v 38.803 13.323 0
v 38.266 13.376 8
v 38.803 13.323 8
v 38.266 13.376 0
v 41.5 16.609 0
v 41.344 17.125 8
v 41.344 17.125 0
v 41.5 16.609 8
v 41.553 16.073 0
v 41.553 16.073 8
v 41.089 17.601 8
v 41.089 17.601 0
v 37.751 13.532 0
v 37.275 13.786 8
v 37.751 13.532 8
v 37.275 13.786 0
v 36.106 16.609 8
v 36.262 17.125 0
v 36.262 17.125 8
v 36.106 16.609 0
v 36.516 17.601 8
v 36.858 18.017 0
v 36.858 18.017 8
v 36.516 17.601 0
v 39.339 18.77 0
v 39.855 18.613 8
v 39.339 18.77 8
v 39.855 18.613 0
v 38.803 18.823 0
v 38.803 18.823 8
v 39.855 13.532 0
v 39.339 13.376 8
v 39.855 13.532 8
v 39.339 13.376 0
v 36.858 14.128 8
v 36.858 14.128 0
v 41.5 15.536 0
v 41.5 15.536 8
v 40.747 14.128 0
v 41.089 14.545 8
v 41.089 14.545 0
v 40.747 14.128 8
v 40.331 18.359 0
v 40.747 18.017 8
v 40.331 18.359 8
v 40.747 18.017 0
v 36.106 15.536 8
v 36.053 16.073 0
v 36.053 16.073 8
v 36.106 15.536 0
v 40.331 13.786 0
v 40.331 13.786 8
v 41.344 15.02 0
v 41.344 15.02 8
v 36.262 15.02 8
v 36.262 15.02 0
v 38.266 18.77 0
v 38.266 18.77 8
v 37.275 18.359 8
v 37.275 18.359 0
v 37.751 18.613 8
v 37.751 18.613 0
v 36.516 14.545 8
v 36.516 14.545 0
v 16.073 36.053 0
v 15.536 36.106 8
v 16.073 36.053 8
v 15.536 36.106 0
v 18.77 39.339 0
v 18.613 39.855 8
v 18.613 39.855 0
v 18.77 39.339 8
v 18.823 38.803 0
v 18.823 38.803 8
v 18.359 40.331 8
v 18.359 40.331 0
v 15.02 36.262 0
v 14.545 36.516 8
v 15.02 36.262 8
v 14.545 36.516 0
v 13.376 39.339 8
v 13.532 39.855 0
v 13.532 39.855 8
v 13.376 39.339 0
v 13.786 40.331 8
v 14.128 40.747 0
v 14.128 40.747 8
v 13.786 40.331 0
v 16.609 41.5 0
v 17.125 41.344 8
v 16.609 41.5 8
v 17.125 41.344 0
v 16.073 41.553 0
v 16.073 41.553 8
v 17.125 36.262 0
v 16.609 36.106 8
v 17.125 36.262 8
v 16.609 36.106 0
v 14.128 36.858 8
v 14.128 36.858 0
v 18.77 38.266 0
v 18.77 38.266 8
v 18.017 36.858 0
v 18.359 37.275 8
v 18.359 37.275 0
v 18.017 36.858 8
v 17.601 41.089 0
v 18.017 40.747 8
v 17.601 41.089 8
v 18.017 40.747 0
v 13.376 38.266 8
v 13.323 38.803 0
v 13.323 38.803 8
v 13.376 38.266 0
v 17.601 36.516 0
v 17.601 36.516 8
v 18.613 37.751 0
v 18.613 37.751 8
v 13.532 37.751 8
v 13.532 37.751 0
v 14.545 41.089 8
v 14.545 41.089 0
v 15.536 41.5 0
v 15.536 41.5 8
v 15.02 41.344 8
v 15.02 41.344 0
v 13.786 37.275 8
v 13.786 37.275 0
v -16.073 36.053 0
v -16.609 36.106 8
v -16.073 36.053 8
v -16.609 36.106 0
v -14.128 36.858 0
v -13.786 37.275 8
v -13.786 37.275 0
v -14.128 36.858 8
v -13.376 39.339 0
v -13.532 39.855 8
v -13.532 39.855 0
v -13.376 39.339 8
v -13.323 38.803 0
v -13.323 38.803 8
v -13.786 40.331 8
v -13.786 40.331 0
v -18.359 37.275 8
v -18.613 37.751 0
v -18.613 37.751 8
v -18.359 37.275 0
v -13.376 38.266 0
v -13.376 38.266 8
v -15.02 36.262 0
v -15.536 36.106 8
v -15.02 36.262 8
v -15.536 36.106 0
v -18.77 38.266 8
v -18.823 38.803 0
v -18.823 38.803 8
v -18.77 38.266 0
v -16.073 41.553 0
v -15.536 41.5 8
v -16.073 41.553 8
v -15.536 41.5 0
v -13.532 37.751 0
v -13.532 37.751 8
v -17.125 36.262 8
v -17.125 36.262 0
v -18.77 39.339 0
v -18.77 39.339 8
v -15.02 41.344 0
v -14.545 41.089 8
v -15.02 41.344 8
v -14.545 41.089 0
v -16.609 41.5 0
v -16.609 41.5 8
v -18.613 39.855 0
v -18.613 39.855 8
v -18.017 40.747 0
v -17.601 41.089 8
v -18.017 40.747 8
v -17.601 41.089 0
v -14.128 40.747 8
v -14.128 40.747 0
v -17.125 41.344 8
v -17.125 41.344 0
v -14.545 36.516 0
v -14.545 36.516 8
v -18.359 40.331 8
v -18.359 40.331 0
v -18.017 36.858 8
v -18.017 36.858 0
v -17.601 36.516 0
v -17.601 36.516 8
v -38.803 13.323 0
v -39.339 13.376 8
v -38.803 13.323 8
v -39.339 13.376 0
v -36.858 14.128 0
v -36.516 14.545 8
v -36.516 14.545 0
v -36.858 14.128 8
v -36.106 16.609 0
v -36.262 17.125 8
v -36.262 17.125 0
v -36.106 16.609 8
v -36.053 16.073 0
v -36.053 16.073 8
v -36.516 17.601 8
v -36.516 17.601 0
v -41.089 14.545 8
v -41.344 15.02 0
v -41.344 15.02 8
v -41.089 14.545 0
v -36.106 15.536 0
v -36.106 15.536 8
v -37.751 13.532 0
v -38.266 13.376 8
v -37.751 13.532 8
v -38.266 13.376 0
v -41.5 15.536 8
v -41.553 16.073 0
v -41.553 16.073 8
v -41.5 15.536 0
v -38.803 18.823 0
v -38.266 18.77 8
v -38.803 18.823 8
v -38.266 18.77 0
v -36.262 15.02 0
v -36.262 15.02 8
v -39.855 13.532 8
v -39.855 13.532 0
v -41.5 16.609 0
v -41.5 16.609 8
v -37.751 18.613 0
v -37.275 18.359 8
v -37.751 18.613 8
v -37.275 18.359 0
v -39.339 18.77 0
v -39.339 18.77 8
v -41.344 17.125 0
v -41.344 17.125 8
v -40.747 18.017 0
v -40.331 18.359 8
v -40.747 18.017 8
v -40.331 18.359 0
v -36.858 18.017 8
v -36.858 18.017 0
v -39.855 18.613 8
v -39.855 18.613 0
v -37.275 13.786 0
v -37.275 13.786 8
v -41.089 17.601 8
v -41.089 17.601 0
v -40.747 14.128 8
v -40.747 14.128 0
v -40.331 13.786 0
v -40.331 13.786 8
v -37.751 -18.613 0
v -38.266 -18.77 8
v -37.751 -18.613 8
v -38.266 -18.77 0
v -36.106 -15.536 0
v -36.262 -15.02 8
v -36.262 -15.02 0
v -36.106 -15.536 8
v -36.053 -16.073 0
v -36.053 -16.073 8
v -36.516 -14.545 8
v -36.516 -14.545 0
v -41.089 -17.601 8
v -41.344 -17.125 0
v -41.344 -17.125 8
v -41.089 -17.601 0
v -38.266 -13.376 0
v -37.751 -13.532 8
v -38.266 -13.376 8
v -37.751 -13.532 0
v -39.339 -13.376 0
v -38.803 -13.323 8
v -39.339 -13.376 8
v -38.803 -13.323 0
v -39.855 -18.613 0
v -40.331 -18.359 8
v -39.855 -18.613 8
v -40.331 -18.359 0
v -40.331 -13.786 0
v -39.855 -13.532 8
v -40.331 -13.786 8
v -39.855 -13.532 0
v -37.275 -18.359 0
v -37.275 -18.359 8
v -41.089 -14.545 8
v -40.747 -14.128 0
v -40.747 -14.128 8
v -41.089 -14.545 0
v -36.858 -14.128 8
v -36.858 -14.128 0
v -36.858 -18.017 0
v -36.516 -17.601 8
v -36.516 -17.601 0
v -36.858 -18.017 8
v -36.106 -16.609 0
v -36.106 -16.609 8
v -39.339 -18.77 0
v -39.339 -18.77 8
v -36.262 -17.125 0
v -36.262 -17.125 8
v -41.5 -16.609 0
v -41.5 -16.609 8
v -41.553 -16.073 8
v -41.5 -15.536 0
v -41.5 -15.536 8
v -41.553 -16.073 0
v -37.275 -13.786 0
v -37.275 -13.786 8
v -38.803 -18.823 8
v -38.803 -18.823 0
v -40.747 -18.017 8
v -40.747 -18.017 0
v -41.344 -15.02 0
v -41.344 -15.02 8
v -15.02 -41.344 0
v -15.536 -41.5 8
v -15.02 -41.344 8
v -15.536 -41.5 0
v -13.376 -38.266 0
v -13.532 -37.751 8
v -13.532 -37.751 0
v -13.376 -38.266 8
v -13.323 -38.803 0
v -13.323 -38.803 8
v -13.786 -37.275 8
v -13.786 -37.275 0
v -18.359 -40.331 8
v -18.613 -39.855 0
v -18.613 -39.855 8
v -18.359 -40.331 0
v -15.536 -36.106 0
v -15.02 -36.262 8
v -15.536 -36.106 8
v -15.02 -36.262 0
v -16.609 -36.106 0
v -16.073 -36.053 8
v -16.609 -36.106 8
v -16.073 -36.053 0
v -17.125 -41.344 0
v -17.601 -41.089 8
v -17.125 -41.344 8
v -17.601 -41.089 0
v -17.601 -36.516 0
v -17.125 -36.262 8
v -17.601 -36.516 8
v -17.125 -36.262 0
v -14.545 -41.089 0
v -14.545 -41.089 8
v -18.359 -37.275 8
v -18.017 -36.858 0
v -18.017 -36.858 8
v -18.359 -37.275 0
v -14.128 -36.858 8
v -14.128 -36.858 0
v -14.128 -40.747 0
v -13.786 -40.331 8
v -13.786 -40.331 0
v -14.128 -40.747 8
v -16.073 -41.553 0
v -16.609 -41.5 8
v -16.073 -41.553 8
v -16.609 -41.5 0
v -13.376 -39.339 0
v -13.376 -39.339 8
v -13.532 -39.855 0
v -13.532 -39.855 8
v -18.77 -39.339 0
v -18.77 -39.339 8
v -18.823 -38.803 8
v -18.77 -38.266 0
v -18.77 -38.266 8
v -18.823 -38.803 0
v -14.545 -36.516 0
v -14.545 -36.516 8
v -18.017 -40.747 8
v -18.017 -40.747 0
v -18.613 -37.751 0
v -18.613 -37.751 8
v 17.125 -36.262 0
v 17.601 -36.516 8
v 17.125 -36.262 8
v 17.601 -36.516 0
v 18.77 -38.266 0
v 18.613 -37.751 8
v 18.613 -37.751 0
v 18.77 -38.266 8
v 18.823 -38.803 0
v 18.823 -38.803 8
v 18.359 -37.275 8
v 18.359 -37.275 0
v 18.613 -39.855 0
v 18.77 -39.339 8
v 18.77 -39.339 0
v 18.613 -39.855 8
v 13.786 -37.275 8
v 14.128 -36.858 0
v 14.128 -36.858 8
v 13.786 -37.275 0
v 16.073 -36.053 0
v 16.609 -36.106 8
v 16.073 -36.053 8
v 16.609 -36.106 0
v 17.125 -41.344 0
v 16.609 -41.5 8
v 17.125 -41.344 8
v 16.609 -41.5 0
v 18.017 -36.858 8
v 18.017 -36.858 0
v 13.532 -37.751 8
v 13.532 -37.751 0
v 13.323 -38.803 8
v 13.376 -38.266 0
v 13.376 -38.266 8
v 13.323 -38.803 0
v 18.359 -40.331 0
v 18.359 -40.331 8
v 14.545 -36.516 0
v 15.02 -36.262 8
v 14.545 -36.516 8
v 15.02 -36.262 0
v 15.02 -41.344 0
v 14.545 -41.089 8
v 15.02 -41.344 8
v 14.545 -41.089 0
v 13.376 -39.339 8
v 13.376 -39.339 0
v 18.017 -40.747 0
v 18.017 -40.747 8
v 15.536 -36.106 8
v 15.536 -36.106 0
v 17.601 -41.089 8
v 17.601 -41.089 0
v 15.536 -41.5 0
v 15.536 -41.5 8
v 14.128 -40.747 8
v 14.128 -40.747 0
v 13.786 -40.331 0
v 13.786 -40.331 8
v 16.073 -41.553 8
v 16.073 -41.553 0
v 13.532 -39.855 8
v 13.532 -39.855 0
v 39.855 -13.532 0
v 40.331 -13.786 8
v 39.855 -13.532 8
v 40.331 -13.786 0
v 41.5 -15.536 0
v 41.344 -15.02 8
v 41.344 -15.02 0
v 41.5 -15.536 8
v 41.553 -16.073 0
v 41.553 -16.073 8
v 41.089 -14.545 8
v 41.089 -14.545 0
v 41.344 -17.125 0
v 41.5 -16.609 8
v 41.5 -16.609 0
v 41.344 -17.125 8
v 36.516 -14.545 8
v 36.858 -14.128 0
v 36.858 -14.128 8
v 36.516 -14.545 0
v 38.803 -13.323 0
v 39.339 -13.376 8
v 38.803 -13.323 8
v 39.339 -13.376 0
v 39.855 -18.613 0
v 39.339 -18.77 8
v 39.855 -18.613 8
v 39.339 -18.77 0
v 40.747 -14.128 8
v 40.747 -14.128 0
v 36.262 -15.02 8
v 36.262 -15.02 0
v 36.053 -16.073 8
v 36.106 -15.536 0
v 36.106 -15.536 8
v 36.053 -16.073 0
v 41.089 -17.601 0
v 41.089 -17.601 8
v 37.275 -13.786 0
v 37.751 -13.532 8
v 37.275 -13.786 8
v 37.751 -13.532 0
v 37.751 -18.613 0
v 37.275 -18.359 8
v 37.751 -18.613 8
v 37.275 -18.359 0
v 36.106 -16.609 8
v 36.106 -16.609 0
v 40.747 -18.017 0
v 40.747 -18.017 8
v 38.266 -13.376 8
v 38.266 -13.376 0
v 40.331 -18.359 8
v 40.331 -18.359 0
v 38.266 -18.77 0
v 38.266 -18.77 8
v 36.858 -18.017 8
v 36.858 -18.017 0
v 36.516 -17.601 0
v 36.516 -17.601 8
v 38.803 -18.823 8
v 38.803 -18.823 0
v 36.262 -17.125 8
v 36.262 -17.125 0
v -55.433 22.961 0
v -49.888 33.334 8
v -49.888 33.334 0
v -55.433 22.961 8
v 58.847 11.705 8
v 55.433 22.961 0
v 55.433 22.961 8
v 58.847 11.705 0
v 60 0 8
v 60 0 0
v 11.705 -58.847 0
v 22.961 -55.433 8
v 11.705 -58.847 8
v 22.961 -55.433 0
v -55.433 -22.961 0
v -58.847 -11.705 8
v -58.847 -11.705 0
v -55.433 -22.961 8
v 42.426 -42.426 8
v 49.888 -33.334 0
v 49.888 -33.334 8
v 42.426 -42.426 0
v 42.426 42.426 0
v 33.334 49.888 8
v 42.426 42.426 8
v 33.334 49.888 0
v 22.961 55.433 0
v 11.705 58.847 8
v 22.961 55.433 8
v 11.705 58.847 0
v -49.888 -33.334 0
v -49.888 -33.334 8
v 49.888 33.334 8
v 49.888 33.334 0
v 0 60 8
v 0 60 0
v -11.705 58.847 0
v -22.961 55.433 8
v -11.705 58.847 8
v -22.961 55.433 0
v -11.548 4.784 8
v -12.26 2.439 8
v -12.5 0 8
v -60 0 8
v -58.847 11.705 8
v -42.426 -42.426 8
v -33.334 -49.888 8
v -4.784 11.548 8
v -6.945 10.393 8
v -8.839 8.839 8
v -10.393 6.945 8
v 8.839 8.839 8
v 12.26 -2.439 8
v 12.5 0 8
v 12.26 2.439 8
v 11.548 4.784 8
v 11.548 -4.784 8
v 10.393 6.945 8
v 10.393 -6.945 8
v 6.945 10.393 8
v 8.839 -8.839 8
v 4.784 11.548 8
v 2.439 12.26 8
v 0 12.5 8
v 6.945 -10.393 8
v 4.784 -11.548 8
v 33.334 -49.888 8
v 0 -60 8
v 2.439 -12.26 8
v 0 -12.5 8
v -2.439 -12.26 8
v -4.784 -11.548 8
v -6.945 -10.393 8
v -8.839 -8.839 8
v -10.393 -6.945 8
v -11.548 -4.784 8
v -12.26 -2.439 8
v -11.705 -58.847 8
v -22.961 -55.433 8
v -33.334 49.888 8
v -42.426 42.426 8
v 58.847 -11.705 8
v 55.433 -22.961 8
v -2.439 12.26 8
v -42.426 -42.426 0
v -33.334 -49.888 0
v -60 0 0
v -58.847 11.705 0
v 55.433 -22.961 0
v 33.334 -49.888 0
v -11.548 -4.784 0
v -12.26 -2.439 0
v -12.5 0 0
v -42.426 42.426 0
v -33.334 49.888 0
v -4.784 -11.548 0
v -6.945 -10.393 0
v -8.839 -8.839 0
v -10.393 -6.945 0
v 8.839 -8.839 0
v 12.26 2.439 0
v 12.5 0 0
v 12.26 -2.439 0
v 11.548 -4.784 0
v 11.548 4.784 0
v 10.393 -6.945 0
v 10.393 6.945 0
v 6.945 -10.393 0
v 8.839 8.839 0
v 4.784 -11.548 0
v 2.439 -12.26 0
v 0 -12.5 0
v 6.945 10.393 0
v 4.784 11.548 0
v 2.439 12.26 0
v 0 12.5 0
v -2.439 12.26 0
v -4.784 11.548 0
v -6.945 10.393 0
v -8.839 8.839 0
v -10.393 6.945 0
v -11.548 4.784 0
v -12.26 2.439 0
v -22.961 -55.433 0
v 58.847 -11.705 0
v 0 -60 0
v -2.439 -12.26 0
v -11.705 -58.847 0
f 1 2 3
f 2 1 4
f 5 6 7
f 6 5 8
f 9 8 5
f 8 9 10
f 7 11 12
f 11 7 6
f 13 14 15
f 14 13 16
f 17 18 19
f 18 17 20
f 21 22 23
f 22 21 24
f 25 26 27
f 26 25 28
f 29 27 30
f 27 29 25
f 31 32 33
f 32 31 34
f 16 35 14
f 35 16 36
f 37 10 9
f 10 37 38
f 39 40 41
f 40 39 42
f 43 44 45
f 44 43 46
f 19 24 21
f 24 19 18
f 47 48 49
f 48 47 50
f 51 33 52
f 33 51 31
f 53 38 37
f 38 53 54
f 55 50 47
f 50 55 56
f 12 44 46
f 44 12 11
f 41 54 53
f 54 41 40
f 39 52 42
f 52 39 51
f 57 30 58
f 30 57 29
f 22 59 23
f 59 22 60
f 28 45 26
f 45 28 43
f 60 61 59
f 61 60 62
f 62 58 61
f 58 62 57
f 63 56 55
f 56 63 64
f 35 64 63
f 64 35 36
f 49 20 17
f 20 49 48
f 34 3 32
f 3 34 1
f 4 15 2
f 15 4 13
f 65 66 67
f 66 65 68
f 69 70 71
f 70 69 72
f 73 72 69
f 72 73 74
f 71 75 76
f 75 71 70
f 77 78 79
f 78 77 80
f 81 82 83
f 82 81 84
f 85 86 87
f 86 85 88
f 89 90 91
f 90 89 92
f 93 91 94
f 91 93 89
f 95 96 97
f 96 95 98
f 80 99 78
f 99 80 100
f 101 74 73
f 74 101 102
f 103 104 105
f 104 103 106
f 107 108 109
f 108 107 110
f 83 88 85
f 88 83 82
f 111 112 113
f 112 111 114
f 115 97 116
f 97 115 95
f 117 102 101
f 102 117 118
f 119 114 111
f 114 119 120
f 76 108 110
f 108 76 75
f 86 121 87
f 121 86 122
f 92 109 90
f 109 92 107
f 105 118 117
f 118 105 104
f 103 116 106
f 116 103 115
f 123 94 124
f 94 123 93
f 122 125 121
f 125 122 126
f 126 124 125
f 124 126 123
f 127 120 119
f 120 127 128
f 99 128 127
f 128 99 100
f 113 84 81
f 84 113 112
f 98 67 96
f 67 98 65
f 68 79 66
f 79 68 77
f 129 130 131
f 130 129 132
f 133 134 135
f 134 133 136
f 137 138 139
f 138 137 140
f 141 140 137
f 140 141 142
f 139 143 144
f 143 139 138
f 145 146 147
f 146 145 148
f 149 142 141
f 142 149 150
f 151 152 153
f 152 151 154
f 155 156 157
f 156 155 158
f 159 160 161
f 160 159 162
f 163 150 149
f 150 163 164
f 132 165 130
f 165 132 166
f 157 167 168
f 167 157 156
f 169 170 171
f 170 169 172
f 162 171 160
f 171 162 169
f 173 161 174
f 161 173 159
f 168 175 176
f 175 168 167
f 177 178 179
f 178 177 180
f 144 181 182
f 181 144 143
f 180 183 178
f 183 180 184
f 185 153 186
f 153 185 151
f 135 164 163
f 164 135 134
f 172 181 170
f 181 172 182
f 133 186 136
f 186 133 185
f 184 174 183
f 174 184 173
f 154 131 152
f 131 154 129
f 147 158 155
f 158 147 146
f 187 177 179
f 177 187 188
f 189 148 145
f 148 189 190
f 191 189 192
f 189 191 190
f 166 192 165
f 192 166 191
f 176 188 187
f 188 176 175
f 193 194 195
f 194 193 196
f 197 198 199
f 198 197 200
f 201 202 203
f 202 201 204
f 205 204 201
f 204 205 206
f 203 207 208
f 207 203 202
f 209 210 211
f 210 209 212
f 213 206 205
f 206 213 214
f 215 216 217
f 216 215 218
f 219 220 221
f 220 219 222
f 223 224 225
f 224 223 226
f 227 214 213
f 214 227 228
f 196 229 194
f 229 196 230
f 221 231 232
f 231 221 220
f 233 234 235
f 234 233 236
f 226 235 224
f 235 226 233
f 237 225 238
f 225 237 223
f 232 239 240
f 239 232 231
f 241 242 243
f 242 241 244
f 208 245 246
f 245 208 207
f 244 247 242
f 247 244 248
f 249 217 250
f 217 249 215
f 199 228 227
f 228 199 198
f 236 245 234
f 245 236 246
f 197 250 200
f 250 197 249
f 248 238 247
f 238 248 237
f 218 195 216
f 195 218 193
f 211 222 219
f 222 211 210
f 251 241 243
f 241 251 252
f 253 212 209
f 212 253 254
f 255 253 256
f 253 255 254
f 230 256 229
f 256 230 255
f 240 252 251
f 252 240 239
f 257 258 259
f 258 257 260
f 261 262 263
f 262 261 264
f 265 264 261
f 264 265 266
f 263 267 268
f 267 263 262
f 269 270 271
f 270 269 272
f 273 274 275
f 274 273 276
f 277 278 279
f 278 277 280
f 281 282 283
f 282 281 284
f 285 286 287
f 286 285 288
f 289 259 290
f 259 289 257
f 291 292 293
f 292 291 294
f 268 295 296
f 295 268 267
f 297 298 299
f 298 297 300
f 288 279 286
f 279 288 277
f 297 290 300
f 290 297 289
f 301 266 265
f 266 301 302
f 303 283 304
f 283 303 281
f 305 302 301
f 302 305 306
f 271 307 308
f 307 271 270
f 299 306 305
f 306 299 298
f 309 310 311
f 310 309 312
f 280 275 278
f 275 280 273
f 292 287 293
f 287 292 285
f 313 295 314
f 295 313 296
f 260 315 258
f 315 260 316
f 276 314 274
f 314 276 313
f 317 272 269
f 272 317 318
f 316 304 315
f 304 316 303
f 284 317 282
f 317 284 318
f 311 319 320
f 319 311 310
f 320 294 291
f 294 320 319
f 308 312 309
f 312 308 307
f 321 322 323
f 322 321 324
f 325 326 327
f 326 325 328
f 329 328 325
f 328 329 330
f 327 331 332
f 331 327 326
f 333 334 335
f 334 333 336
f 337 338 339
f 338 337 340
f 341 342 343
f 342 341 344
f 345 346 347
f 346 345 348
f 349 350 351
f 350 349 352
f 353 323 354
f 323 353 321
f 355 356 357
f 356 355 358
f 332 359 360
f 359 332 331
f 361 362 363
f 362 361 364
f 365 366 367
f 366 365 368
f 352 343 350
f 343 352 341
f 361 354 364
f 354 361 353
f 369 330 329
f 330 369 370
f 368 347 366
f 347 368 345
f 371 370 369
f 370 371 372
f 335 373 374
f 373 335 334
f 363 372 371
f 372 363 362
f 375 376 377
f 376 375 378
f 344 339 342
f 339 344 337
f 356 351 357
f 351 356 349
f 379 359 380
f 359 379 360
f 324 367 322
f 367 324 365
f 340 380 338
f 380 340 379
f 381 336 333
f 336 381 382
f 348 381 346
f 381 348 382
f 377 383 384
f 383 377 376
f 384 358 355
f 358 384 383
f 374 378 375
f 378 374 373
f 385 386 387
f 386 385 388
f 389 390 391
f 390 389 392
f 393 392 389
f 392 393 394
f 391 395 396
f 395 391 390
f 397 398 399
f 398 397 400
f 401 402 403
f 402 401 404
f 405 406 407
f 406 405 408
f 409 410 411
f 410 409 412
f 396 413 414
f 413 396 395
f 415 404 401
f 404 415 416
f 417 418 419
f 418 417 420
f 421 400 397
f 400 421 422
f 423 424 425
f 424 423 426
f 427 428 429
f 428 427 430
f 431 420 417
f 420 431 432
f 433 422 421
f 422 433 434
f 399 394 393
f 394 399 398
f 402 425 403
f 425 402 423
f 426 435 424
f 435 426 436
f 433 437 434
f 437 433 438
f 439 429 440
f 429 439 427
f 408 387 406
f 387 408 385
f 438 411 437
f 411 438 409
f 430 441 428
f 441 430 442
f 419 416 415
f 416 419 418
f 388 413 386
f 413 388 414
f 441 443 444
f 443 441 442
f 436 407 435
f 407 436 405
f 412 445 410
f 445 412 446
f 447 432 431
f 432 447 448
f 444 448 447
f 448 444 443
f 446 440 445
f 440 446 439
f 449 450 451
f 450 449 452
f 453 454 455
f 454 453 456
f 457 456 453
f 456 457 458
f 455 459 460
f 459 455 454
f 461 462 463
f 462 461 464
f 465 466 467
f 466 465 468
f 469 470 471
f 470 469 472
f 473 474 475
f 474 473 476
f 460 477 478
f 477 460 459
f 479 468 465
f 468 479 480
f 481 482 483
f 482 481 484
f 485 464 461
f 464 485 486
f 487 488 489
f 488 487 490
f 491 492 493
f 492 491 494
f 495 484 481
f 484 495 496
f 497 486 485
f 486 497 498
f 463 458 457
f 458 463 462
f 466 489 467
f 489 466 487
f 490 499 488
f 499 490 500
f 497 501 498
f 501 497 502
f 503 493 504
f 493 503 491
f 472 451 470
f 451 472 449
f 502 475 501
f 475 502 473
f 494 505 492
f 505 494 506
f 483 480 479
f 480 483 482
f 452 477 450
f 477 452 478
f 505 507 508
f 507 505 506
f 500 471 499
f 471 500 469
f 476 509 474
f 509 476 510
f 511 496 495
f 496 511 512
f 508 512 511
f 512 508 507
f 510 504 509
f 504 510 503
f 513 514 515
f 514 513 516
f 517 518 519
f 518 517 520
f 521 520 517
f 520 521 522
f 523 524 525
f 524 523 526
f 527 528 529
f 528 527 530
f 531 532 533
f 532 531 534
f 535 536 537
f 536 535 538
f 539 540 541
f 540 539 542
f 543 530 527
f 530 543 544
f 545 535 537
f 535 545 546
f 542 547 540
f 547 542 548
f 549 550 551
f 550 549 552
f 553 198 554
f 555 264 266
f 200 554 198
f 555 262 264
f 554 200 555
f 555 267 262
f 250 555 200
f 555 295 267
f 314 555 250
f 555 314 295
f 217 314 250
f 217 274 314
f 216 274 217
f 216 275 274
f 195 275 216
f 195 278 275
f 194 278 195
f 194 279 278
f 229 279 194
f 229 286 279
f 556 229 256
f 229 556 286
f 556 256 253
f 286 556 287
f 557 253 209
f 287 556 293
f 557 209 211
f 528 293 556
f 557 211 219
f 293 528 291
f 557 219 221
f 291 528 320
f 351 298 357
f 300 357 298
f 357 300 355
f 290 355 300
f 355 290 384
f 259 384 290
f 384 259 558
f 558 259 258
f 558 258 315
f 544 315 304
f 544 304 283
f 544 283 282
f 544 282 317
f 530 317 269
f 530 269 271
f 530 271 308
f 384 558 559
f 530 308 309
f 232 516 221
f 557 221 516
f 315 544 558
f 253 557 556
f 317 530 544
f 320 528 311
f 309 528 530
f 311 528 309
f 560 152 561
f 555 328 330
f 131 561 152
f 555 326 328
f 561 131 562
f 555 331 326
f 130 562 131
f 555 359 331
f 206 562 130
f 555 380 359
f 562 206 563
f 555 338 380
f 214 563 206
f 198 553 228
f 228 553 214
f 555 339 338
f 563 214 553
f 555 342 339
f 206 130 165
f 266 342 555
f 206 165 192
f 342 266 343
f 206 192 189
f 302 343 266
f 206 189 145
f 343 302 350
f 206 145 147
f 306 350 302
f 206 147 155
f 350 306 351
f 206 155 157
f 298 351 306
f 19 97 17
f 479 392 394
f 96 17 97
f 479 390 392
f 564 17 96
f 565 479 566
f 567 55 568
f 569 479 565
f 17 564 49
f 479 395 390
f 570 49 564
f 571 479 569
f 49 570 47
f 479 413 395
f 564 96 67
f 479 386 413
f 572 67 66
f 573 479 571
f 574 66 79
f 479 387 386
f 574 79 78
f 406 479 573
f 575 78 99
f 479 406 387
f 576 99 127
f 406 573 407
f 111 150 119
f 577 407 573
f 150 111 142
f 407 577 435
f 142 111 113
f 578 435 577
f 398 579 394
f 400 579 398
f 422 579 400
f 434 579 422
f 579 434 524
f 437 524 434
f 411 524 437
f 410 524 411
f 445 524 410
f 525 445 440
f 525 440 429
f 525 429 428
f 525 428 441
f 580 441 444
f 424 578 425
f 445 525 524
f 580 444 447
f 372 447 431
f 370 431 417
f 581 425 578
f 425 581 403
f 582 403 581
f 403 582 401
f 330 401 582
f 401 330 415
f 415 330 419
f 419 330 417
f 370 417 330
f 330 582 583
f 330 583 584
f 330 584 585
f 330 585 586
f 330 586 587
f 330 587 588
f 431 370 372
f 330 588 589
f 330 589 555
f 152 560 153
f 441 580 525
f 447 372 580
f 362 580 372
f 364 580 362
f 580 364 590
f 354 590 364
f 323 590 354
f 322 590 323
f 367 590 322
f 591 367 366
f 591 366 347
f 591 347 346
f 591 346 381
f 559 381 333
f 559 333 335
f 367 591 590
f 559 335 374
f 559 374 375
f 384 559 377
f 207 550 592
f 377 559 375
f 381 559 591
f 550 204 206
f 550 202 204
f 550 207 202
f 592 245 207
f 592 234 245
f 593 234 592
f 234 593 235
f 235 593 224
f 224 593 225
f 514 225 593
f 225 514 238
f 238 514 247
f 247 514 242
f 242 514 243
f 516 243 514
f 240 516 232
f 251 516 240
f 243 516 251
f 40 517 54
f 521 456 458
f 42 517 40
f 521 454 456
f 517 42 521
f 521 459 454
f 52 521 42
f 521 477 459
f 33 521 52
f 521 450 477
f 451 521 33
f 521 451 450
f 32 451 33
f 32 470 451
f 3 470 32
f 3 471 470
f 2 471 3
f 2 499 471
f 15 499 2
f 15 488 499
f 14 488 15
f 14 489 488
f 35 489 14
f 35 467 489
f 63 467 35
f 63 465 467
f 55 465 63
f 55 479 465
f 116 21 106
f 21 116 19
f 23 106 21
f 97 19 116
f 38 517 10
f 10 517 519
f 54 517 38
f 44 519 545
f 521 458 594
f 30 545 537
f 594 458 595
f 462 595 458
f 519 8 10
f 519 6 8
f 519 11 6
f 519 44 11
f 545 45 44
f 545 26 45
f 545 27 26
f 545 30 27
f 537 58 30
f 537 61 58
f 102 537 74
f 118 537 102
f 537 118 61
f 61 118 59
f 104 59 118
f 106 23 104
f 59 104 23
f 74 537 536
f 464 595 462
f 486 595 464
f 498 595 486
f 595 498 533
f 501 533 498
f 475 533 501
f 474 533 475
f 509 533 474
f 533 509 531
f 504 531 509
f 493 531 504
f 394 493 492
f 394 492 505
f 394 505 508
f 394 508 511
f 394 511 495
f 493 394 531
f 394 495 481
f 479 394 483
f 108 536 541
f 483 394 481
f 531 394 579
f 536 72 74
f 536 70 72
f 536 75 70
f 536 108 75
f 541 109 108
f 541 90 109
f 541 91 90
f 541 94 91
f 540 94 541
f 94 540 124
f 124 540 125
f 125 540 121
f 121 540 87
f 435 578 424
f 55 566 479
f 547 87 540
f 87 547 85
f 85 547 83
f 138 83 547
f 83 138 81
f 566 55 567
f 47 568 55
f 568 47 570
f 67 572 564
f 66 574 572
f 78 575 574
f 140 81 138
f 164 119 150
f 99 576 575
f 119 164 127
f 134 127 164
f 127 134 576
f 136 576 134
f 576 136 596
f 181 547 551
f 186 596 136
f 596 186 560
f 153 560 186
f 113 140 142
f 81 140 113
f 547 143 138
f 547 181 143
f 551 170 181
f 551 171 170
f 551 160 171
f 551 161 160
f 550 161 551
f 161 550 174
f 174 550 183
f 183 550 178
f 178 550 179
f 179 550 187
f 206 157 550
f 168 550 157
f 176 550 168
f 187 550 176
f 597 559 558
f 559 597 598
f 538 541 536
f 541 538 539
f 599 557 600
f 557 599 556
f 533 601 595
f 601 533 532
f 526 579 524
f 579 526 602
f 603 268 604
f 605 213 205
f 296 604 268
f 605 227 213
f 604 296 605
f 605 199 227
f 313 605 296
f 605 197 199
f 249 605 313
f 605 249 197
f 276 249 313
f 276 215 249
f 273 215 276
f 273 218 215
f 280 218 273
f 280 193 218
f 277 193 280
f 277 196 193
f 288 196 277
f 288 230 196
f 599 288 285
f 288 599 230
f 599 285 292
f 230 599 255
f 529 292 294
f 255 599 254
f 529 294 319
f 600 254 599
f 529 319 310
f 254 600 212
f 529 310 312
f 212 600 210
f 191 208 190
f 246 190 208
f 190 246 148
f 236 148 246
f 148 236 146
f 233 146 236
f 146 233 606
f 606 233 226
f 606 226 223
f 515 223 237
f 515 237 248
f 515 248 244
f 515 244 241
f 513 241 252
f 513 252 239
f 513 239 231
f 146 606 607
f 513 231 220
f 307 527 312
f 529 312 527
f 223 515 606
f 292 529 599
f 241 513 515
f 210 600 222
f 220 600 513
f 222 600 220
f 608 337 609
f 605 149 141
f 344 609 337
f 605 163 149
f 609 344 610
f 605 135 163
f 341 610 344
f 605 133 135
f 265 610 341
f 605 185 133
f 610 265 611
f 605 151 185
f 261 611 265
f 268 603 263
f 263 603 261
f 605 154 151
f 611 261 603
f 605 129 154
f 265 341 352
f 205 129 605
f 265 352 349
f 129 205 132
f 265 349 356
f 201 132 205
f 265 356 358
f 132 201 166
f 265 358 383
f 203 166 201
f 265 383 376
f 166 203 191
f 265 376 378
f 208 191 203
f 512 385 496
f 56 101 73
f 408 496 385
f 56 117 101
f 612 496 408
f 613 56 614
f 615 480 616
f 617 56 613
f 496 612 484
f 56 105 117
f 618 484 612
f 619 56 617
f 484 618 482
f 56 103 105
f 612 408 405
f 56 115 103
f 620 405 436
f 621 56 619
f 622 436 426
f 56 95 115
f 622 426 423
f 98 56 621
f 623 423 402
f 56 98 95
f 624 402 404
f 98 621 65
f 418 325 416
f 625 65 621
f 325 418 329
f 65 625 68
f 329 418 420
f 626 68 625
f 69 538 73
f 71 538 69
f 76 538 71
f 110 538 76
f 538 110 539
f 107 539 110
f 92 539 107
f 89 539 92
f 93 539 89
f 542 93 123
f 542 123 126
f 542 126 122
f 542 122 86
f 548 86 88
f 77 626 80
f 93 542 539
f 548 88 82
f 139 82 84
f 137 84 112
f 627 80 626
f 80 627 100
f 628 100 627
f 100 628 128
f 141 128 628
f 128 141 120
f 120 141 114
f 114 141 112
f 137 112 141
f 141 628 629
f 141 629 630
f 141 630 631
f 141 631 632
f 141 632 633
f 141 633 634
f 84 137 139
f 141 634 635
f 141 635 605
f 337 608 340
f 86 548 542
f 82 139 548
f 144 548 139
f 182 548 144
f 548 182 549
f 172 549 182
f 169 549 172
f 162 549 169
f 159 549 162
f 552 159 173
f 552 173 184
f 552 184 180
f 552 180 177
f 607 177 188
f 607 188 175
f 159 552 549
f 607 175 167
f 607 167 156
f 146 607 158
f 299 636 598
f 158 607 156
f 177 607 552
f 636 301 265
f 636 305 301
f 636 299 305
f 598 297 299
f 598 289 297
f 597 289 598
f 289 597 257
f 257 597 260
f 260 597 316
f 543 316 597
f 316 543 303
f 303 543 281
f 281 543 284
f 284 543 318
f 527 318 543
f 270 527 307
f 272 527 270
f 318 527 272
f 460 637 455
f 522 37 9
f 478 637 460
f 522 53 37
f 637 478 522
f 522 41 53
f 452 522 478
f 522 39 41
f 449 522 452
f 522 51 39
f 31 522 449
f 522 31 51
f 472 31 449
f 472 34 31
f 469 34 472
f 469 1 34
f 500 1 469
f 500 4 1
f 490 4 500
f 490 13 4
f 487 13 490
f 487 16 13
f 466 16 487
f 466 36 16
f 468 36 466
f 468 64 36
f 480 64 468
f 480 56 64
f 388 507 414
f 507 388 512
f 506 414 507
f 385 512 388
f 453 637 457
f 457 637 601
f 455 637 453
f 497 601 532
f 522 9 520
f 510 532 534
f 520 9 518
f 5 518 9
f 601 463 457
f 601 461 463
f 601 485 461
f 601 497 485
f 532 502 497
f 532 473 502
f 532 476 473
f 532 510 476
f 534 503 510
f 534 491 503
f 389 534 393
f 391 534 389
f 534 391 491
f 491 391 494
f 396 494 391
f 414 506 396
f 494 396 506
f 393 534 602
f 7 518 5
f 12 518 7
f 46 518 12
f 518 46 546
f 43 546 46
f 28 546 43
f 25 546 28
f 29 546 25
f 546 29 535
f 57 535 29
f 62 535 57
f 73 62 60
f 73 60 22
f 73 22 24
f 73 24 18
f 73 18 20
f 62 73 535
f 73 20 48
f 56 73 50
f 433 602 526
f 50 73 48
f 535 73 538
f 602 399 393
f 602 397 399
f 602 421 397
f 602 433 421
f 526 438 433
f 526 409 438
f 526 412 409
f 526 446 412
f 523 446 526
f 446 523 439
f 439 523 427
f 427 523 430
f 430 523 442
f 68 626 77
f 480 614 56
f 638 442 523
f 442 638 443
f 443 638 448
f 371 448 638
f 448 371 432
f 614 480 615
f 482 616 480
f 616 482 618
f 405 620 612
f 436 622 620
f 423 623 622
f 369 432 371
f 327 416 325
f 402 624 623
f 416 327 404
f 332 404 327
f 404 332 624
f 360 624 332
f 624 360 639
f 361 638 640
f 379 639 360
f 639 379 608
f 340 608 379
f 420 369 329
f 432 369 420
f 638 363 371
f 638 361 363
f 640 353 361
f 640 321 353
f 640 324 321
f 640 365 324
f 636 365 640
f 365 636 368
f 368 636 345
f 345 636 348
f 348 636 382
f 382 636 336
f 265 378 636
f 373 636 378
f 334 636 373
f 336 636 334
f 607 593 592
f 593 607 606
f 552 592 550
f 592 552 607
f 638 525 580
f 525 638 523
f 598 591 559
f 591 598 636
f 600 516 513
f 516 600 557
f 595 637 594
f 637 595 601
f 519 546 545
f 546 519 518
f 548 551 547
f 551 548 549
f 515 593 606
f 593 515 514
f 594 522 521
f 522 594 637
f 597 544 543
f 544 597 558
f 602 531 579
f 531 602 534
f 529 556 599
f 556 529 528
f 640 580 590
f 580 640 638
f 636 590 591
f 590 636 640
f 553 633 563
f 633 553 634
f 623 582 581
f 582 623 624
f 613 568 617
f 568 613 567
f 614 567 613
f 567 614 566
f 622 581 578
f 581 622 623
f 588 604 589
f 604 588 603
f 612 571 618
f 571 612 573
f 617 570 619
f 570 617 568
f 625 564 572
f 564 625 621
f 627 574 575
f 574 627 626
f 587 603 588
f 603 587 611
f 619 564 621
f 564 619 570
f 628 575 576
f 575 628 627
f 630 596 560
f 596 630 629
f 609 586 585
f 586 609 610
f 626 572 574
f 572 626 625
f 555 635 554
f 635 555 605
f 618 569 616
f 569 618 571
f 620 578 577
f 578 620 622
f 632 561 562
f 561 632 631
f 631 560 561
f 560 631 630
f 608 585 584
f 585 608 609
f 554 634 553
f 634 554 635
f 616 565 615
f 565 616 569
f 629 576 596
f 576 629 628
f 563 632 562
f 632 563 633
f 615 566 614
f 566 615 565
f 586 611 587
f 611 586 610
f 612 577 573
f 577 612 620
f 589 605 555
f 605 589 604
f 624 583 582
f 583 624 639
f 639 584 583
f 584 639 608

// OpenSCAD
$fn = 32;

// ----------------------------------------------------------------------
// Flange Ø120 x 8
// 8 holes on a Ø84 bolt circle, bolted joints
// ----------------------------------------------------------------------

// --- parameters (mm) ---
flange_d = 120;    // outside diameter of the flange
thickness = 8;     // flange thickness
holes = 8;         // number of bolt holes
pcd = 84;          // bolt circle diameter
start_deg = 22.5;  // angle of the first hole, from +X
hole_d = 5.5;      // bolt hole diameter
bore_d = 25;       // central through bore
hub_d = 35;        // hub outside diameter
hub_h = 0;         // hub height above the flange face (0 = no hub)

// --- derived feature positions (mm) ---
height = thickness + hub_h;  // = 8   overall height of the part
pcd_r = pcd / 2;             // = 42   bolt circle radius
hole_step = 360 / holes;     // = 45   angular pitch
feature_centers = [
  [pcd_r * cos(start_deg + 0 * hole_step), pcd_r * sin(start_deg + 0 * hole_step)],
  [pcd_r * cos(start_deg + 1 * hole_step), pcd_r * sin(start_deg + 1 * hole_step)],
  [pcd_r * cos(start_deg + 2 * hole_step), pcd_r * sin(start_deg + 2 * hole_step)],
  [pcd_r * cos(start_deg + 3 * hole_step), pcd_r * sin(start_deg + 3 * hole_step)],
  [pcd_r * cos(start_deg + 4 * hole_step), pcd_r * sin(start_deg + 4 * hole_step)],
  [pcd_r * cos(start_deg + 5 * hole_step), pcd_r * sin(start_deg + 5 * hole_step)],
  [pcd_r * cos(start_deg + 6 * hole_step), pcd_r * sin(start_deg + 6 * hole_step)],
  [pcd_r * cos(start_deg + 7 * hole_step), pcd_r * sin(start_deg + 7 * hole_step)]
];   // bolt hole centres on the pitch circle

// flange disc, every hole and the bore cut straight through
difference() {
  union() {
    cylinder(d = flange_d, h = thickness);
  }
  translate([0, 0, -1]) cylinder(d = bore_d, h = height + 2);  // bore, through
  for (centre = feature_centers)
    translate([centre[0], centre[1], -1]) cylinder(d = hole_d, h = thickness + 2);
}
